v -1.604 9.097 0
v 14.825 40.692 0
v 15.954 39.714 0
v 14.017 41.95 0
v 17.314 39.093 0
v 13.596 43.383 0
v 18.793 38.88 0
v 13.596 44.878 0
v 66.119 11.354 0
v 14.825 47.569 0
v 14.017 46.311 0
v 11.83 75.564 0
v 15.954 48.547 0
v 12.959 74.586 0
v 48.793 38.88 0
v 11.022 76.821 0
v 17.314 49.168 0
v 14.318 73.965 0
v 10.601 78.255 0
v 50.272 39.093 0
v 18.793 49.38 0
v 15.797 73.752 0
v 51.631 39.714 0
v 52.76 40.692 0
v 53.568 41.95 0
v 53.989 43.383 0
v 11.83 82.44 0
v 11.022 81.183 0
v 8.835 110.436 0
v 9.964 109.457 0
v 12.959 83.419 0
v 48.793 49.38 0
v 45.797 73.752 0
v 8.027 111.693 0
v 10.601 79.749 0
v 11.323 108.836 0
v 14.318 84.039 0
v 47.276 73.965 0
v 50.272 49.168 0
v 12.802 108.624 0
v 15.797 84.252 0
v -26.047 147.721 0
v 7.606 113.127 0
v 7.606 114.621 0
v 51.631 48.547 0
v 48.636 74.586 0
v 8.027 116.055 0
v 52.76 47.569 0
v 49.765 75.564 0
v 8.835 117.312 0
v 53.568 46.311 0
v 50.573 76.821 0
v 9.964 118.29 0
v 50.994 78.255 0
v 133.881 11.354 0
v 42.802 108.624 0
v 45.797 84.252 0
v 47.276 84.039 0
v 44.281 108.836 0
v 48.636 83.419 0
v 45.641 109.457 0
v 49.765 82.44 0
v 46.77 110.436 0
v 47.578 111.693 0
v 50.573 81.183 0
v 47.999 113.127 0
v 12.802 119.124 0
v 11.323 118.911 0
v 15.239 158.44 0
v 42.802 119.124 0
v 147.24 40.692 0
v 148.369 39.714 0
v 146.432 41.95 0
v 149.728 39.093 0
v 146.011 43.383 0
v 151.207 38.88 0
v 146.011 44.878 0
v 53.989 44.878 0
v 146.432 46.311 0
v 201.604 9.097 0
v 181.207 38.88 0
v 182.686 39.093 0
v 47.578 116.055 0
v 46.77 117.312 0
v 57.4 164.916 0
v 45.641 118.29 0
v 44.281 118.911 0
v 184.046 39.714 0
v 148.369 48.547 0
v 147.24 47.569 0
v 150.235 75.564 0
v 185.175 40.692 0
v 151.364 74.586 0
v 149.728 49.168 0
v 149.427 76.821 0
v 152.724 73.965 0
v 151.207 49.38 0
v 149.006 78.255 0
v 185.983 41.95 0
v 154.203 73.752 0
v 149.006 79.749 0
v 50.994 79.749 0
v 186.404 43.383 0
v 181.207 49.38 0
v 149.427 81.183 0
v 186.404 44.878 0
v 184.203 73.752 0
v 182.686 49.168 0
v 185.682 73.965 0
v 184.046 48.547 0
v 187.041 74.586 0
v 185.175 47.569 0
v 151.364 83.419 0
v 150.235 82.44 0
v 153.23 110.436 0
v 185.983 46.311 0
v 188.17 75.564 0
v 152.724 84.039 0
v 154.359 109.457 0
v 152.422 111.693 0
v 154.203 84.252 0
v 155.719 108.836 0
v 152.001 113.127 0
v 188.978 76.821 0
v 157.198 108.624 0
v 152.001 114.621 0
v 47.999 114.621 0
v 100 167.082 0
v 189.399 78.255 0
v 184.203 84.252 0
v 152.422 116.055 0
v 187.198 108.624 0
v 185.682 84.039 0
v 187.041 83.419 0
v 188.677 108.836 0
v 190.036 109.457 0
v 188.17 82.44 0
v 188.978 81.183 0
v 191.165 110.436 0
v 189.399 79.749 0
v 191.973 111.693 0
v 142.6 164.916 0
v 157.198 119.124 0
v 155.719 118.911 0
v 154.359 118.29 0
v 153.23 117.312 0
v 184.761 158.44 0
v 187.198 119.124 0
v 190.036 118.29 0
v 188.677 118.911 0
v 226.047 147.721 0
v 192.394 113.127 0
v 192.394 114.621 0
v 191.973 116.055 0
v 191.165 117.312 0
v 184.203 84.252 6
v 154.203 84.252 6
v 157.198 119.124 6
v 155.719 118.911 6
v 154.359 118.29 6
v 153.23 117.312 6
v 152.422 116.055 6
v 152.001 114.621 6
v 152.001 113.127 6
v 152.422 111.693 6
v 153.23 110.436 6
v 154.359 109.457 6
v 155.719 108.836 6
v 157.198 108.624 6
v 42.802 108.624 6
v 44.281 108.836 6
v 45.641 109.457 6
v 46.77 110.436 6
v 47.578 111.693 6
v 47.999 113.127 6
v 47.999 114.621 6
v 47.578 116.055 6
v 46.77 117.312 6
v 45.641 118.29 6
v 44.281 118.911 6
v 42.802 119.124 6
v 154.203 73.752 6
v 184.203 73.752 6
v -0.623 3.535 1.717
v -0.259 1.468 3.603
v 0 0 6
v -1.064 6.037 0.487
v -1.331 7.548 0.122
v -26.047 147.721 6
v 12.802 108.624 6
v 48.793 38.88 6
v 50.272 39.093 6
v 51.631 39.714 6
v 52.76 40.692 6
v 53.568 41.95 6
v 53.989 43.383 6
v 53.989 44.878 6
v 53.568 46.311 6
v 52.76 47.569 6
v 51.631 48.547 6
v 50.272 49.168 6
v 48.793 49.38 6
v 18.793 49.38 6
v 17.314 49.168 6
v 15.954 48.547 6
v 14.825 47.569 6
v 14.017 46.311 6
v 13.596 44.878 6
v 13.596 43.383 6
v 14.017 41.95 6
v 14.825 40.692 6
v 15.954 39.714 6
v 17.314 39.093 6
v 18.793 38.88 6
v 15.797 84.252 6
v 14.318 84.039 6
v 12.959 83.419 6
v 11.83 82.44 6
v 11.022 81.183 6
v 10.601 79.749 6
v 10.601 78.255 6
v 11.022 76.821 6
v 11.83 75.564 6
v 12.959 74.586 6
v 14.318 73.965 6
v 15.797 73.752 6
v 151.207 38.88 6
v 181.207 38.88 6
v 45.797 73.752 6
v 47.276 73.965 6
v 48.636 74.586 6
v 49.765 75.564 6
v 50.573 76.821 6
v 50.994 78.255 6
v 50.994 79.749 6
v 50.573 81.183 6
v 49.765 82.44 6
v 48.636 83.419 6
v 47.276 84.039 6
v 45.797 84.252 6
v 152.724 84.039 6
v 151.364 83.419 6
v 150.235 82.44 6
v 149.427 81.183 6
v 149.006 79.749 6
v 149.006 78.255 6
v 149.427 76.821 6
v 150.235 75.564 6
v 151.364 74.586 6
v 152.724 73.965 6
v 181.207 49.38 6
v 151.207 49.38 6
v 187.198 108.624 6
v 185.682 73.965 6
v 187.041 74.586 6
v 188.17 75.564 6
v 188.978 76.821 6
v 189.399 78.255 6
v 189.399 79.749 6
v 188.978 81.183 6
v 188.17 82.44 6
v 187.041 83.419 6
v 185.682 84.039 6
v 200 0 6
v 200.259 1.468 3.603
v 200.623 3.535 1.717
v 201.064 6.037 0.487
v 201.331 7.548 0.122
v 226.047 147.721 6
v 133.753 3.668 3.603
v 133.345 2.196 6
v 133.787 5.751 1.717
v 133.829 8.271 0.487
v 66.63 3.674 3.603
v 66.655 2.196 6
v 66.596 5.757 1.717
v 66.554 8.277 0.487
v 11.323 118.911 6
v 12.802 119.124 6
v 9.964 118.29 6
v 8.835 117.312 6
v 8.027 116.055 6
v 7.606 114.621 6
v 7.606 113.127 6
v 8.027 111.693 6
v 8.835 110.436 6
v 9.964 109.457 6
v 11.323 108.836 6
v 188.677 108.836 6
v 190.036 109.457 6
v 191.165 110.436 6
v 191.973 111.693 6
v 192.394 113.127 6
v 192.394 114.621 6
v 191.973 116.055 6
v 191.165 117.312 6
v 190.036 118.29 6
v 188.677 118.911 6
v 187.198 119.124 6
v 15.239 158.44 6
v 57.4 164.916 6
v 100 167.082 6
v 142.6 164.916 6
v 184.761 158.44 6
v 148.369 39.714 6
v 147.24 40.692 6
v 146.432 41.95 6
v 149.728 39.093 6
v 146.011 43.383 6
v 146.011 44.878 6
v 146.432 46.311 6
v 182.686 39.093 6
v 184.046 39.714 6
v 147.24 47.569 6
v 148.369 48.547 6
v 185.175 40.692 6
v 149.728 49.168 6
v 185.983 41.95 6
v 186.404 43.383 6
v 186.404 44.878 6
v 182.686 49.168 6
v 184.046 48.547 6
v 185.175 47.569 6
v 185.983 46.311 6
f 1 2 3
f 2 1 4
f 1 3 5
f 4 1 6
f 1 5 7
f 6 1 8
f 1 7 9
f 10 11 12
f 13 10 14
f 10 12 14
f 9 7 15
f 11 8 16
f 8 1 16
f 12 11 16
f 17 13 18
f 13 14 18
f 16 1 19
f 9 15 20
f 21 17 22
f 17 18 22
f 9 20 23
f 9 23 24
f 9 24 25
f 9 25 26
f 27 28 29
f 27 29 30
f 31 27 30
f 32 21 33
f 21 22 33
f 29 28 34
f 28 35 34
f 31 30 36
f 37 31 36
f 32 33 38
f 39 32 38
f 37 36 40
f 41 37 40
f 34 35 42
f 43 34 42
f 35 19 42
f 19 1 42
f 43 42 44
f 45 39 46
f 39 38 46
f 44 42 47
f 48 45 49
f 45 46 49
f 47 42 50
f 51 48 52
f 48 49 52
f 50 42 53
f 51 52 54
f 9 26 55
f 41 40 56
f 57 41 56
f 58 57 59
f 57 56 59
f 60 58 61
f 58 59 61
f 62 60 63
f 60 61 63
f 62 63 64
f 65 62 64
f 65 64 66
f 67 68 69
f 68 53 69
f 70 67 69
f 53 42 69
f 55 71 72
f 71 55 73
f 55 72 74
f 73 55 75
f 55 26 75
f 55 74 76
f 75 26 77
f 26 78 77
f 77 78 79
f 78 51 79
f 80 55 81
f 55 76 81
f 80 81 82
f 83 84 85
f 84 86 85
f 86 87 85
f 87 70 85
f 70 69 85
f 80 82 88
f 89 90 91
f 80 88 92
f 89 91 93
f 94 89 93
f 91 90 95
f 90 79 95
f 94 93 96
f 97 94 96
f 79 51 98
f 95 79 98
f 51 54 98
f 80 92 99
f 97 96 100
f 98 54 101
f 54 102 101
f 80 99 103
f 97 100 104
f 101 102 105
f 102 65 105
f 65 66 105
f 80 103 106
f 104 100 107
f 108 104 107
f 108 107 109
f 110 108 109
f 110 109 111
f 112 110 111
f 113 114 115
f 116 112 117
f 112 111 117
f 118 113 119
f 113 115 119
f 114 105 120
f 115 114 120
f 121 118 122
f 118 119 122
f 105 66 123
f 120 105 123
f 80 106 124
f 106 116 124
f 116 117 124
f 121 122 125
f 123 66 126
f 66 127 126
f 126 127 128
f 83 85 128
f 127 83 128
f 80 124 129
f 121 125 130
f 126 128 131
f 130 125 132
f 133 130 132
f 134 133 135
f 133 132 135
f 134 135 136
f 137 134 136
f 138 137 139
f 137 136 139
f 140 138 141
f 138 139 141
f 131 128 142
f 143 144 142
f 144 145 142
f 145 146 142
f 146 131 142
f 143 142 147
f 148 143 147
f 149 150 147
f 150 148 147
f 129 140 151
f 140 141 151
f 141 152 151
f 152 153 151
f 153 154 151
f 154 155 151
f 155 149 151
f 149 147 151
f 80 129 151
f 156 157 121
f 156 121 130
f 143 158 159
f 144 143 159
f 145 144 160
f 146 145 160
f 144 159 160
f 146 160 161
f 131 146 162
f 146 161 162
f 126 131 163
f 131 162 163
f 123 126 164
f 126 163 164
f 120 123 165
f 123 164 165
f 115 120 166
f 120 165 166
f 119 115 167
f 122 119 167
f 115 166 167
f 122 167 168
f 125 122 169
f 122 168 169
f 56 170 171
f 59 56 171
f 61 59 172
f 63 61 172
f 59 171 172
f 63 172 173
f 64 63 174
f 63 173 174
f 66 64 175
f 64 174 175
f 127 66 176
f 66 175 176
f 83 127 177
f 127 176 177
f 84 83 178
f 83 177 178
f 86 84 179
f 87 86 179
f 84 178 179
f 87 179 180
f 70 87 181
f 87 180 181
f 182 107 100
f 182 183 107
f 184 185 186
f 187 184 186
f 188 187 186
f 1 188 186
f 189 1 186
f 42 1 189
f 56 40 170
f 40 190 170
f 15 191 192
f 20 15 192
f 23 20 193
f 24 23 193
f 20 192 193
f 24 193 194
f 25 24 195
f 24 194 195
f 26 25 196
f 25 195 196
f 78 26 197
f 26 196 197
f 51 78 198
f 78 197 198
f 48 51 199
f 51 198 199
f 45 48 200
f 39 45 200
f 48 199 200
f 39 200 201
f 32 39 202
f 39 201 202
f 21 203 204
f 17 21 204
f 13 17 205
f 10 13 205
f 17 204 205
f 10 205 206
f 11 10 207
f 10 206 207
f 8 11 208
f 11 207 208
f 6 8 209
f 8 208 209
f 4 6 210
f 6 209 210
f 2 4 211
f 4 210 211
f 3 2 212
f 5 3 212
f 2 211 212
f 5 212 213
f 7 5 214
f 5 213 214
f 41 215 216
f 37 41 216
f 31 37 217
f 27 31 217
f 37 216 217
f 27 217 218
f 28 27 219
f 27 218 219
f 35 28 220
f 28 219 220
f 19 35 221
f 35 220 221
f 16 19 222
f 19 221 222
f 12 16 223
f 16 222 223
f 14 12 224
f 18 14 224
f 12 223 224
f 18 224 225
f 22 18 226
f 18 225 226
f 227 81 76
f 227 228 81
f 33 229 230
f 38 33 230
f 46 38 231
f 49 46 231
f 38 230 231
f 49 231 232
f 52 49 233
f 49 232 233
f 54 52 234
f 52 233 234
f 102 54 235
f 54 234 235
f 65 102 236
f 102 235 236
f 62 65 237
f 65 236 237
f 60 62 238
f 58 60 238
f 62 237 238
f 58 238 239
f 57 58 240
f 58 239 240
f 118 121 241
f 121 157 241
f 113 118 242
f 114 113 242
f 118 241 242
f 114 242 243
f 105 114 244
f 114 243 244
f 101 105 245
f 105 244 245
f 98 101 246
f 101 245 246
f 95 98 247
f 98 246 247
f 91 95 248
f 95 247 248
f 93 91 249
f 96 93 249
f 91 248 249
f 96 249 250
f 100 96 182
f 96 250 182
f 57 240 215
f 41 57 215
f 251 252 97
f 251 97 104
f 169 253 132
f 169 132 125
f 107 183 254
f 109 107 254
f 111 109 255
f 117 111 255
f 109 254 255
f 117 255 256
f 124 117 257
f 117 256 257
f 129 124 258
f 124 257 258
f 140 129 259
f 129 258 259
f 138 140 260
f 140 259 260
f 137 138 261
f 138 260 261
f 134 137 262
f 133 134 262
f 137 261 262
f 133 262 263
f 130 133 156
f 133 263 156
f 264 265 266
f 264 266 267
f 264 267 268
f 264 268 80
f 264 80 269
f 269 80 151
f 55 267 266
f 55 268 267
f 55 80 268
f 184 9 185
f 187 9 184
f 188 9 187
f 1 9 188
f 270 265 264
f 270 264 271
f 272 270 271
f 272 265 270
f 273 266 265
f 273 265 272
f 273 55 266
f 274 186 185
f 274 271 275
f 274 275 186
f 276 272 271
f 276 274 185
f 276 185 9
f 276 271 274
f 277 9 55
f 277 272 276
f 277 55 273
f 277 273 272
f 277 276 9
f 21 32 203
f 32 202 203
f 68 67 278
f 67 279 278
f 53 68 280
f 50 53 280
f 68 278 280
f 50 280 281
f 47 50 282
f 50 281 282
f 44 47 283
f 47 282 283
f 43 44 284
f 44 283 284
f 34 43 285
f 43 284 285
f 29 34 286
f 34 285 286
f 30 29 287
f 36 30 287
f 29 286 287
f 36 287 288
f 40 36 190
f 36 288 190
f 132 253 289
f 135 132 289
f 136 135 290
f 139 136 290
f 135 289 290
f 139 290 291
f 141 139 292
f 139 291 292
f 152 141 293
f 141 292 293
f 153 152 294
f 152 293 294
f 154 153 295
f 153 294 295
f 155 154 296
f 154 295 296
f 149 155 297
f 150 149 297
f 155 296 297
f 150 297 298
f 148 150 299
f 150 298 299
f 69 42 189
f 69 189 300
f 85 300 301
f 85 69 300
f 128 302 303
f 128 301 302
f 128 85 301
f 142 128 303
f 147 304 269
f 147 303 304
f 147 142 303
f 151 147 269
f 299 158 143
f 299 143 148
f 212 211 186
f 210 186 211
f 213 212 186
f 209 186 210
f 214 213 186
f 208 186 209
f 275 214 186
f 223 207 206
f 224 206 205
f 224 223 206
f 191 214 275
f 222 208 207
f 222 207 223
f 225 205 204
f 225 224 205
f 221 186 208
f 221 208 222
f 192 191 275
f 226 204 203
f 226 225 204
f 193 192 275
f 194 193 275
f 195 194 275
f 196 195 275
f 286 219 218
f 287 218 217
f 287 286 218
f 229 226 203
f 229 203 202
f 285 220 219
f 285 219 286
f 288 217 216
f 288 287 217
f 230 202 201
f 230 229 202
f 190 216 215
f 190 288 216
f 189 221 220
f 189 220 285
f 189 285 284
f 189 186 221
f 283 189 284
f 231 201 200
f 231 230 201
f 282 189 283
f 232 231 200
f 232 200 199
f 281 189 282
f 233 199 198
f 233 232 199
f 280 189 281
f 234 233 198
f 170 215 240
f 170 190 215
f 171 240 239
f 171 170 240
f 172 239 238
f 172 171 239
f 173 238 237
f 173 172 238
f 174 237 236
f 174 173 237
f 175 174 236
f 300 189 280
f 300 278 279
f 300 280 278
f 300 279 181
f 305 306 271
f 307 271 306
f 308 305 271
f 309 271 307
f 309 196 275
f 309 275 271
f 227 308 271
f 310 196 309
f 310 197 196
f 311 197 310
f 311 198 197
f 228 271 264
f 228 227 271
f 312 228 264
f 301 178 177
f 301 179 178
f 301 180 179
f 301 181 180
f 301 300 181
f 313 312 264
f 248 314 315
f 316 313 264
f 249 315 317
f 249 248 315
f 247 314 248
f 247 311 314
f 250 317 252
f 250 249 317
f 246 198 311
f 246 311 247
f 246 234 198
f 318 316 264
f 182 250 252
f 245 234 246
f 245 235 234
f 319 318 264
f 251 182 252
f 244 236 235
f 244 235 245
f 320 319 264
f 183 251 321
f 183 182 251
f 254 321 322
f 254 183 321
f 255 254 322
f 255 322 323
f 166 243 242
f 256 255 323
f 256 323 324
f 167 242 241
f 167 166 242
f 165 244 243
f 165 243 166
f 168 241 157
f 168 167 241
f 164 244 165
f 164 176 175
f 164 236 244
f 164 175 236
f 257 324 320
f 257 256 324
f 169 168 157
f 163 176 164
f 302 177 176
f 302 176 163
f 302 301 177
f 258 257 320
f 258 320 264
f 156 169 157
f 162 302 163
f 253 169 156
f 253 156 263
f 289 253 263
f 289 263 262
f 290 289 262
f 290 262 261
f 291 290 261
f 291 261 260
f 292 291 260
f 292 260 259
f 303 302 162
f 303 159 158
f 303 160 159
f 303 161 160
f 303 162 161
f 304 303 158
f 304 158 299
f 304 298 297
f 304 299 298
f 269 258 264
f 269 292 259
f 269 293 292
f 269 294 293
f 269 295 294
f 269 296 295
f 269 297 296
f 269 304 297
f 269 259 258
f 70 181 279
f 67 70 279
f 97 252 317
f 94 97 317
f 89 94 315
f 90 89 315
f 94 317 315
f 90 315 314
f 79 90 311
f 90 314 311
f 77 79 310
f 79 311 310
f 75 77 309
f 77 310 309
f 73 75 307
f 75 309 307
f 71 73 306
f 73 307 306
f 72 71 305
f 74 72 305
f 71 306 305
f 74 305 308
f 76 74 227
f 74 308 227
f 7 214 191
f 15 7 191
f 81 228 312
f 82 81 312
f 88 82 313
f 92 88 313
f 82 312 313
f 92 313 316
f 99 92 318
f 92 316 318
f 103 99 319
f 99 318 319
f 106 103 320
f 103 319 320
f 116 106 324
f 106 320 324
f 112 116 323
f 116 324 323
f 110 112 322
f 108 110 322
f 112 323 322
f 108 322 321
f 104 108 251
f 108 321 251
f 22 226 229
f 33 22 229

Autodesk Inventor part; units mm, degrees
ref_plane "YZ Plane" through (0, 0, 0) normal (1, 0, 0) x (0, 1, 0)
ref_plane "XZ Plane" through (0, 0, 0) normal (0, 1, 0) x (-1, 0, 0)
ref_plane "XY Plane" through (0, 0, 0) normal (0, 0, 1) x (1, 0, 0)
sketch "Sketch1" plane through (0, 0, 0) normal (0, 0, 1) x (1, 0, 0)
  line L0 (0, 0) -> (200, 0) construction
  arc A0 (200, 0) -> (0, 0) centre (100, -2022.5294) ccw
  line L1 (200, 0) -> (226.0472, 147.7212)
  line L2 (200, 0) -> (350, 0) construction
  line L3 (100, 2.4706) -> (100, 110.946)
  line L4 (0, 0) -> (-26.0472, 147.7212)
  arc A1 (226.0472, 147.7212) -> (-26.0472, 147.7212) centre (100, -252.9184) ccw
  dimension "d4" = 2025
  dimension "d5" = 150
  dimension "d6" = 80
  dimension "d7" = 420
  dimension "d20" = 200
extrude "Plate1" add sketch "Sketch1" along normal blind 6
sketch "Sketch2" plane through (0, 0, 6) normal (0, 0, 1) x (1, 0, 0)
  arc A0 (200, 0) -> (0, 0) centre (100, -2022.5294) ccw projected
  line L0 (100, 2.4706) -> (100, 167.0816)
  arc A1 (226.0472, 147.7212) -> (-26.0472, 147.7212) centre (100, -252.9184) ccw projected
  arc A2 (100, 2.4706) -> (0, 0) centre (100, -2022.5294) ccw
  arc A3 (100, 167.0816) -> (-26.0472, 147.7212) centre (100, -252.9184) ccw
  line L1 (45.7974, 79.0021) -> (15.7974, 79.0021) construction
  line L2 (45.7974, 84.2521) -> (15.7974, 84.2521)
  line L3 (15.7974, 73.7521) -> (45.7974, 73.7521)
  arc A4 (45.7974, 73.7521) -> (45.7974, 84.2521) centre (45.7974, 79.0021) ccw
  arc A5 (15.7974, 84.2521) -> (15.7974, 73.7521) centre (15.7974, 79.0021) ccw
  line L4 (30.7974, 79.0021) -> (27.8022, 113.8737)
  line L5 (30.7974, 79.0021) -> (33.7926, 44.1305)
  line L6 (18.7926, 44.1305) -> (48.7926, 44.1305) construction
  line L7 (18.7926, 38.8805) -> (48.7926, 38.8805)
  line L8 (48.7926, 49.3805) -> (18.7926, 49.3805)
  arc A6 (18.7926, 49.3805) -> (18.7926, 38.8805) centre (18.7926, 44.1305) ccw
  arc A7 (48.7926, 38.8805) -> (48.7926, 49.3805) centre (48.7926, 44.1305) ccw
  line L9 (33.7926, 44.1305) -> (63.7926, 44.1305) construction
  line L10 (12.8022, 113.8737) -> (42.8022, 113.8737) construction
  line L11 (12.8022, 108.6237) -> (42.8022, 108.6237)
  line L12 (42.8022, 119.1237) -> (12.8022, 119.1237)
  arc A8 (12.8022, 119.1237) -> (12.8022, 108.6237) centre (12.8022, 113.8737) ccw
  arc A9 (42.8022, 108.6237) -> (42.8022, 119.1237) centre (42.8022, 113.8737) ccw
  line L13 (154.2026, 79.0021) -> (184.2026, 79.0021) construction
  line L14 (154.2026, 84.2521) -> (184.2026, 84.2521)
  line L15 (184.2026, 73.7521) -> (154.2026, 73.7521)
  arc A10 (154.2026, 84.2521) -> (154.2026, 73.7521) centre (154.2026, 79.0021) ccw
  arc A11 (184.2026, 73.7521) -> (184.2026, 84.2521) centre (184.2026, 79.0021) ccw
  line L16 (169.2026, 79.0021) -> (172.1978, 113.8737)
  line L17 (169.2026, 79.0021) -> (166.2074, 44.1305)
  line L18 (181.2074, 44.1305) -> (151.2074, 44.1305) construction
  line L19 (181.2074, 38.8805) -> (151.2074, 38.8805)
  line L20 (151.2074, 49.3805) -> (181.2074, 49.3805)
  arc A12 (181.2074, 38.8805) -> (181.2074, 49.3805) centre (181.2074, 44.1305) ccw
  arc A13 (151.2074, 49.3805) -> (151.2074, 38.8805) centre (151.2074, 44.1305) ccw
  line L21 (187.1978, 113.8737) -> (157.1978, 113.8737) construction
  line L22 (187.1978, 108.6237) -> (157.1978, 108.6237)
  line L23 (157.1978, 119.1237) -> (187.1978, 119.1237)
  arc A14 (187.1978, 108.6237) -> (187.1978, 119.1237) centre (187.1978, 113.8737) ccw
  arc A15 (157.1978, 119.1237) -> (157.1978, 108.6237) centre (157.1978, 113.8737) ccw
  dimension "d9" = 15
  dimension "d10" = 10.5
  dimension "d11" = 35
  dimension "d12" = 35
  dimension "d13" = 15
  dimension "d14" = 0
  dimension "d15" = 10.5
  dimension "d16" = 15
  dimension "d17" = 10.5
extrude "Cut1" cut sketch "Sketch2" against normal blind 6
fillet "Fillet1" radius 10 1 edges at (100, 2.4706, 0)
equation "\"d18\" = Thickness"
equation "\"d8\" = Thickness"
equation "\"BendRadius\" = Thickness"
equation "\"BendReliefWidth\" = Thickness"
equation "\"BendReliefDepth\" = 0.5 * Thickness"
equation "\"CornerReliefSize\" = 4 * Thickness"
equation "\"MinimumRemnant\" = 2 * Thickness"
equation "\"TransitionRadius\" = BendRadius"
equation "\"JacobiRadiusSize\" = BendRadius"
equation "\"GapSize\" = Thickness"
equation "\"Thickness\" = 6"
properties part number "Double Shear Plate"
